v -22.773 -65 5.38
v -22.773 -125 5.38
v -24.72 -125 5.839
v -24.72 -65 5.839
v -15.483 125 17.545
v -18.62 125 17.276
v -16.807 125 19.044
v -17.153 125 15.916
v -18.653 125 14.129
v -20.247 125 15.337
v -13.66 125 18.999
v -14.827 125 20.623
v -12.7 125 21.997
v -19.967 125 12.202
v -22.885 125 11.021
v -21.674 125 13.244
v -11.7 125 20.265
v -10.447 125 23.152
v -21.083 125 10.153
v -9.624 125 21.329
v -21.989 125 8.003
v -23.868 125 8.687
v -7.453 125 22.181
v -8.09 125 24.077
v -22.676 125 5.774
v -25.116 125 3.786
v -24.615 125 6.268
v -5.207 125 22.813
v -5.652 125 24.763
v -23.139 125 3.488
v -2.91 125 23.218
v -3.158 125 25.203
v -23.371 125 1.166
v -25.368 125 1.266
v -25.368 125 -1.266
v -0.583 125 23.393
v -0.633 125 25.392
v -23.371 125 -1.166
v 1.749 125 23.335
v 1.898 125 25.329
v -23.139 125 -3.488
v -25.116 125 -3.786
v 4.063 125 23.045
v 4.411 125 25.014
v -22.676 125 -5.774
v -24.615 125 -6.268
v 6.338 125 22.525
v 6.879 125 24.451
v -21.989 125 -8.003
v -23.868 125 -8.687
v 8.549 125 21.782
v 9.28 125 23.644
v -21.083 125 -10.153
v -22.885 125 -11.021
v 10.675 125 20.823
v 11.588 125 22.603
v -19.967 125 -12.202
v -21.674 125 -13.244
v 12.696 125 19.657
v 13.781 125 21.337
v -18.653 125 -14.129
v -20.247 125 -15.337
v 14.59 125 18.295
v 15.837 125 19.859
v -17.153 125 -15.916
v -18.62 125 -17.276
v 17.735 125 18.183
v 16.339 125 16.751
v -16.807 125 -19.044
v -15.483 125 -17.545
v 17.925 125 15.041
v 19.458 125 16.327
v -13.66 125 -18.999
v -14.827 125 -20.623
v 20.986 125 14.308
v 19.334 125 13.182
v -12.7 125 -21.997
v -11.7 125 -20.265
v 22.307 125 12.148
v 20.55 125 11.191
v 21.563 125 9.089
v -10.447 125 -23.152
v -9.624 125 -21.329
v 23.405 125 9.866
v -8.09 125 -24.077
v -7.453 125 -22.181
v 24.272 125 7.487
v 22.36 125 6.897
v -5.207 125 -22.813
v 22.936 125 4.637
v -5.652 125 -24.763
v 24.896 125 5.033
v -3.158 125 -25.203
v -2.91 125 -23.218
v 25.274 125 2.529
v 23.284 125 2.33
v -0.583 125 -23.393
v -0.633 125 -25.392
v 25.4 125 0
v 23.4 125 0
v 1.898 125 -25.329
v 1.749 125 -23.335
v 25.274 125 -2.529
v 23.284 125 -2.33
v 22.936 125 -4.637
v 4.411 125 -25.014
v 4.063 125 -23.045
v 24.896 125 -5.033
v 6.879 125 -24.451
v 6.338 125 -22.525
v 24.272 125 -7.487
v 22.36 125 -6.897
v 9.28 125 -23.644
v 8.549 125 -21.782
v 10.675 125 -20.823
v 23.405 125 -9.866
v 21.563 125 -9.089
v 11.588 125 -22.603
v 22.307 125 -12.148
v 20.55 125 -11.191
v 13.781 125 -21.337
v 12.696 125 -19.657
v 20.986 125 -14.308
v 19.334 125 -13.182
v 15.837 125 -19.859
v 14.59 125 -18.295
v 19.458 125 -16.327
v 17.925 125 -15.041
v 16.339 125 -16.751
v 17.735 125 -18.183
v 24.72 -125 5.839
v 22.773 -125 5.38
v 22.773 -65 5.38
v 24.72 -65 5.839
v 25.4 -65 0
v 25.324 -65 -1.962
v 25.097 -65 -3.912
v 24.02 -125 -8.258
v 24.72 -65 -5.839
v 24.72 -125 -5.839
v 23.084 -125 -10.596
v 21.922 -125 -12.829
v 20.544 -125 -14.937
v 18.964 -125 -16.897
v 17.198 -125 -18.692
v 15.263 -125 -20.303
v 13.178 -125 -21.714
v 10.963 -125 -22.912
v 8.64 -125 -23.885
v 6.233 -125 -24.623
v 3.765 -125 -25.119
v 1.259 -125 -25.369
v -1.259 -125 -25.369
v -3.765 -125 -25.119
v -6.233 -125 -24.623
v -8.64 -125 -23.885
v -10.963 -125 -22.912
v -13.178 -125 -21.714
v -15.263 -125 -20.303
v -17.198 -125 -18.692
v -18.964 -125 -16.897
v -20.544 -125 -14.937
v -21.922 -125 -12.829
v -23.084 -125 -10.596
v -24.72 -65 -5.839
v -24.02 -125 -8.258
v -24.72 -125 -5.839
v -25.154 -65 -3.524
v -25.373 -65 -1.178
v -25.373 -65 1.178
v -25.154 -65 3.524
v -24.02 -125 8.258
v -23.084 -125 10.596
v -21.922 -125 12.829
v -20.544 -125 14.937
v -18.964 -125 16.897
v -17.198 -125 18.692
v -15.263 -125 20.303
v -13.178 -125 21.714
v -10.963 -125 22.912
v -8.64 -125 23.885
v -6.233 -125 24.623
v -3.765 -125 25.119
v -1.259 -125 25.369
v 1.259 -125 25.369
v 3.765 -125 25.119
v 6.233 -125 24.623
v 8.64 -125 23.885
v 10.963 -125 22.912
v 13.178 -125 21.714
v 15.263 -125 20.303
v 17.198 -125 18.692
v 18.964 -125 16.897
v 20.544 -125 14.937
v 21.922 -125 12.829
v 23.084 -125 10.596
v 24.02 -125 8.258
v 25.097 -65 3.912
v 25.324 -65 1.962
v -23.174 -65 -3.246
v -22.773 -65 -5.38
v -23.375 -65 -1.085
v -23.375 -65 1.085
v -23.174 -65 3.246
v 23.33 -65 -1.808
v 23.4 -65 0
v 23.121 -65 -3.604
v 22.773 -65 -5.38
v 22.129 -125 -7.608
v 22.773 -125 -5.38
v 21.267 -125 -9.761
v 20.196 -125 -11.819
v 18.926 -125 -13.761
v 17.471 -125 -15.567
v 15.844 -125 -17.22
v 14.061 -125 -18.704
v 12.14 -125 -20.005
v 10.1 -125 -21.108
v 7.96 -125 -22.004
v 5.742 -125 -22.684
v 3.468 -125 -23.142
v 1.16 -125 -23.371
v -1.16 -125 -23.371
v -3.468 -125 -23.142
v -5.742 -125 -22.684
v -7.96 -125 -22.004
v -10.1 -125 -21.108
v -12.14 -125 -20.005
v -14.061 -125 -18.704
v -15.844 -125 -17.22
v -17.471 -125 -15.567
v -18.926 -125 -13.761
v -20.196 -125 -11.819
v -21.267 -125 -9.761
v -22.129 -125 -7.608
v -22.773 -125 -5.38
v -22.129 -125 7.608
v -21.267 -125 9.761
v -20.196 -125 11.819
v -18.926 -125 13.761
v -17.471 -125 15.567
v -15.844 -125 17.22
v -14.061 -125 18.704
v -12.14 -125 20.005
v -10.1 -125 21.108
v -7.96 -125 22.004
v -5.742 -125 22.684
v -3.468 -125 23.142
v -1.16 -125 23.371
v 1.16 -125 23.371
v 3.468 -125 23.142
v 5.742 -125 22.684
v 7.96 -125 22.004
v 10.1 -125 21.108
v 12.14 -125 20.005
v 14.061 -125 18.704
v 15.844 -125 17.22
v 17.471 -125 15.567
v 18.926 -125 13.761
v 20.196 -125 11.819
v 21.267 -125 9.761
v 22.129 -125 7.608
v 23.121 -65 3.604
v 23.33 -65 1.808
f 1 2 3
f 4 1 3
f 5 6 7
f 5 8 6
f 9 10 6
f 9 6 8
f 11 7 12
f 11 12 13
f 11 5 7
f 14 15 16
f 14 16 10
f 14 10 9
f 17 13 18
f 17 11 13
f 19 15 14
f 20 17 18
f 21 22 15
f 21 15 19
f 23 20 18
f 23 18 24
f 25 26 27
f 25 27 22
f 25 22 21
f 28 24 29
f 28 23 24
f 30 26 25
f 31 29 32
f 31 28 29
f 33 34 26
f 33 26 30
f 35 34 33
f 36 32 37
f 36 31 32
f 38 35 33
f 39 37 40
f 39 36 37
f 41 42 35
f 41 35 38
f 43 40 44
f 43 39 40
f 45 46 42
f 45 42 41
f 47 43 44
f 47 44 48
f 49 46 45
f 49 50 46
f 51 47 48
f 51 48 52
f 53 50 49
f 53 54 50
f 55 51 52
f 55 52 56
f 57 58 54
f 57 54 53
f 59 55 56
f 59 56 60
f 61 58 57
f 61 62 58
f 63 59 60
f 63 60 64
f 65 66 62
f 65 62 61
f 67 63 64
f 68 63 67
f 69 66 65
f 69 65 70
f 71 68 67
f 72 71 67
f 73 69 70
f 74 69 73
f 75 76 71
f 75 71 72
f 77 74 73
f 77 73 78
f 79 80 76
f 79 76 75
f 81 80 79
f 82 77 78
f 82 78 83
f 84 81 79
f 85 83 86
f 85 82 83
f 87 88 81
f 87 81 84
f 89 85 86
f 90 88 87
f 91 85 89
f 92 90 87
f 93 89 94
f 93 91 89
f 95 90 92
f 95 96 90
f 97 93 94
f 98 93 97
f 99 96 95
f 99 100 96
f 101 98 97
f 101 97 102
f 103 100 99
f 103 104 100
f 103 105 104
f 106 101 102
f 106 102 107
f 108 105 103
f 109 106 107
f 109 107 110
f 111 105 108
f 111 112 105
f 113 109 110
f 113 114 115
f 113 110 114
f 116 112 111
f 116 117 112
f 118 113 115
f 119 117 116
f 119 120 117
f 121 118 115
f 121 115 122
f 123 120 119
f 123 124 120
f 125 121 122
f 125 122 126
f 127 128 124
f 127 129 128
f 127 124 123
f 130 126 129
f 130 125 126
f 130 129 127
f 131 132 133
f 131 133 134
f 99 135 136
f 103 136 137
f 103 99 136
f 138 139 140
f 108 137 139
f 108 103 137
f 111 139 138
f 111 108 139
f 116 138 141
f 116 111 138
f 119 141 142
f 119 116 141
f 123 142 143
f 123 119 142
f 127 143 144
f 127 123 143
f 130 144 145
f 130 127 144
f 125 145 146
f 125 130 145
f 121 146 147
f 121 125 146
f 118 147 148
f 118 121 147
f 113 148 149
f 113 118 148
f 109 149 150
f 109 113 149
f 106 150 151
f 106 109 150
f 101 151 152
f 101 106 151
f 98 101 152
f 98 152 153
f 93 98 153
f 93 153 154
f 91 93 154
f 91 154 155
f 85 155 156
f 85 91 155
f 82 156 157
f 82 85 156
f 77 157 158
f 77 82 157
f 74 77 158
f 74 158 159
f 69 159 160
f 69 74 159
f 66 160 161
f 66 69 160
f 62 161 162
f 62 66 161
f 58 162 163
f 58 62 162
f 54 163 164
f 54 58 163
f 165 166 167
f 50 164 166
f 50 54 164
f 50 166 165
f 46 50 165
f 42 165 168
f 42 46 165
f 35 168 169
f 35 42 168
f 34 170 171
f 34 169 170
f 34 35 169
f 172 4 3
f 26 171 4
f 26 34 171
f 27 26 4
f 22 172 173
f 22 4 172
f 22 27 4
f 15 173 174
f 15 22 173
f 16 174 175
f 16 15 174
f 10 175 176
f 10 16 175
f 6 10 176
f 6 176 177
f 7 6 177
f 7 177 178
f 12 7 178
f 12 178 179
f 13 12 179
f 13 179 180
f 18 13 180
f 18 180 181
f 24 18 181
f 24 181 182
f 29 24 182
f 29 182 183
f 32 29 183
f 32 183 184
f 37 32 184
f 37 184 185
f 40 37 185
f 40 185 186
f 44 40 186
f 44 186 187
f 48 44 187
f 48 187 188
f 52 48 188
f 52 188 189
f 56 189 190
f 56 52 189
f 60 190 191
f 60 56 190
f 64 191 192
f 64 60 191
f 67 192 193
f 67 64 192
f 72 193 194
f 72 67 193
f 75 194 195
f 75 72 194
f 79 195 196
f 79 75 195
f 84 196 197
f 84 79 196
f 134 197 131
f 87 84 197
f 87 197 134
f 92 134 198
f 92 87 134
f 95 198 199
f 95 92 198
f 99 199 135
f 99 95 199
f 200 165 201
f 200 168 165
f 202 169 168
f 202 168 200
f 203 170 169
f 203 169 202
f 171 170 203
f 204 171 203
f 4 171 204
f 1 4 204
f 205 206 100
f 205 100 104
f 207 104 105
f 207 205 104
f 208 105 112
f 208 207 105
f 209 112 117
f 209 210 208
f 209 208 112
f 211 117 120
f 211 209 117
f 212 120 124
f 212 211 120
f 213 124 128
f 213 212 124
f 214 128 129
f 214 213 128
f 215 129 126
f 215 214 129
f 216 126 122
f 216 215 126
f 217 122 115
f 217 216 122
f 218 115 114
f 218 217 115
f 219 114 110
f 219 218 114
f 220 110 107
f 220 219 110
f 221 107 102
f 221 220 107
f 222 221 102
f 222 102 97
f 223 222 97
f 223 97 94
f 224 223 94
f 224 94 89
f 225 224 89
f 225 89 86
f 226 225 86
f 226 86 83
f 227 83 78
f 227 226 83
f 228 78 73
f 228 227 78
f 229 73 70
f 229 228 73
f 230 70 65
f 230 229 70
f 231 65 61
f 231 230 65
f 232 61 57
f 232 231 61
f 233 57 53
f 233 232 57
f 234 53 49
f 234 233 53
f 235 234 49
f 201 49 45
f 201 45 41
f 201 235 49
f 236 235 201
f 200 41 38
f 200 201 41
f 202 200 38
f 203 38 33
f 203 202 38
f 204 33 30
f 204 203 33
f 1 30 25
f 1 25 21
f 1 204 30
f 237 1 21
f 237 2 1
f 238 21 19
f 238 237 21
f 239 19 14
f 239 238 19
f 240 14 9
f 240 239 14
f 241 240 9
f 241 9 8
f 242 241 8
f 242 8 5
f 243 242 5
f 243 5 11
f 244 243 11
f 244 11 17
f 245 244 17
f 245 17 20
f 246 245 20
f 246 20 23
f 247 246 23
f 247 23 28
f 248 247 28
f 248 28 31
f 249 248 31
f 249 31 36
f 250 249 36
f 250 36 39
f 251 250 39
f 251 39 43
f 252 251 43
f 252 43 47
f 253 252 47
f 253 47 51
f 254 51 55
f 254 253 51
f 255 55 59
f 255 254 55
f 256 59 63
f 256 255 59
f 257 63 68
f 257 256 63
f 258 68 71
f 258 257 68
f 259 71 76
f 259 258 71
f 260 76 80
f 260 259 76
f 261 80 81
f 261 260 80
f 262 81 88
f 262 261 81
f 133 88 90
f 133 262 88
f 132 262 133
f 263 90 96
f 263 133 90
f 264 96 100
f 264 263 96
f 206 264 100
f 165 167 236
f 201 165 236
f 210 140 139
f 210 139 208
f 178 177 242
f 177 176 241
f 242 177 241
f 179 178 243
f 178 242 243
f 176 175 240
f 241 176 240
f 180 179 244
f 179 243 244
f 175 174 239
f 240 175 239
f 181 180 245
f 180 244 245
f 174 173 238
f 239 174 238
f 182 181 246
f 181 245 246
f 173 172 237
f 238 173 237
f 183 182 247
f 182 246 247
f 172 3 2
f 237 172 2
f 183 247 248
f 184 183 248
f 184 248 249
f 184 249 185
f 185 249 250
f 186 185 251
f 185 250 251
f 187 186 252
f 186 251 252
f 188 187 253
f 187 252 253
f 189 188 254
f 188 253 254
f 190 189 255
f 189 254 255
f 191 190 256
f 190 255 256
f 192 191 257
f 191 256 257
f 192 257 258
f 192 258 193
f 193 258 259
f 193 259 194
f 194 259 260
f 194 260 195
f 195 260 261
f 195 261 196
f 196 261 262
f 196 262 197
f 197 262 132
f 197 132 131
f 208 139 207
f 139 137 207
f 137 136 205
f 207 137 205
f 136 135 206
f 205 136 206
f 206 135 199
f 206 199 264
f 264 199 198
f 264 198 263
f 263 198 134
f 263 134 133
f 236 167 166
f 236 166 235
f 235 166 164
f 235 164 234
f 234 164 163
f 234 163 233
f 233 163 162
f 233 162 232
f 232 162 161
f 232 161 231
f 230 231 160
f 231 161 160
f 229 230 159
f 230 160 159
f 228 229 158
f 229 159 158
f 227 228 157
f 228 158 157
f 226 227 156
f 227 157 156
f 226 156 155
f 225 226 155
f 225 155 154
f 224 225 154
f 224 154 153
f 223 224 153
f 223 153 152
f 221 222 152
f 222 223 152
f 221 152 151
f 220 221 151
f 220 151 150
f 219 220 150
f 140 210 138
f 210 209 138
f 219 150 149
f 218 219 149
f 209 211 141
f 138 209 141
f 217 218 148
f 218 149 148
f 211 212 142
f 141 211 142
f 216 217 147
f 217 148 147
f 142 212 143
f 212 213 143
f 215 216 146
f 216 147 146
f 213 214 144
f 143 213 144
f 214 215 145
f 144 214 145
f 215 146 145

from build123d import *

# Parameters (mm, degrees)
SKETCH1_R           = 25.4
SKETCH1_R_2         = 23.4
BOSS_EXTRUDE1_DEPTH = 125
CUT_EXTRUDE1_DEPTH  = 60


with BuildPart() as part:
    # Sketch1 → Boss-Extrude1 (new body, symmetric)
    with BuildSketch(Plane(origin=(0, 0, 0), x_dir=(1, 0, 0), z_dir=(0, 1, 0))):
        Circle(SKETCH1_R)
        Circle(SKETCH1_R_2, mode=Mode.SUBTRACT)
    extrude(amount=BOSS_EXTRUDE1_DEPTH, both=True)

    # Sketch2 → Cut-Extrude1 (cut)
    with BuildSketch(Plane.XZ.offset(125)):
        with BuildLine():
            Line((-24.719681161, -5.839294762), (-22.773249573, -5.379507773))
            ThreePointArc((-22.773249573, -5.379507773), (-23.4, 0), (-22.773249573, 5.379507773))
            Line((-22.773249573, 5.379507773), (-24.719681161, 5.839294762))
            ThreePointArc((-24.719681161, 5.839294762), (-25.4, 0), (-24.719681161, -5.839294762))
        make_face()
        with BuildLine():
            Line((24.719681161, -5.839294762), (22.773249573, -5.379507773))
            ThreePointArc((22.773249573, -5.379507773), (23.4, 0), (22.773249573, 5.379507773))
            Line((22.773249573, 5.379507773), (24.719681161, 5.839294762))
            ThreePointArc((24.719681161, 5.839294762), (25.4, 0), (24.719681161, -5.839294762))
        make_face()
    extrude(amount=-CUT_EXTRUDE1_DEPTH, mode=Mode.SUBTRACT)


solid = part.part
